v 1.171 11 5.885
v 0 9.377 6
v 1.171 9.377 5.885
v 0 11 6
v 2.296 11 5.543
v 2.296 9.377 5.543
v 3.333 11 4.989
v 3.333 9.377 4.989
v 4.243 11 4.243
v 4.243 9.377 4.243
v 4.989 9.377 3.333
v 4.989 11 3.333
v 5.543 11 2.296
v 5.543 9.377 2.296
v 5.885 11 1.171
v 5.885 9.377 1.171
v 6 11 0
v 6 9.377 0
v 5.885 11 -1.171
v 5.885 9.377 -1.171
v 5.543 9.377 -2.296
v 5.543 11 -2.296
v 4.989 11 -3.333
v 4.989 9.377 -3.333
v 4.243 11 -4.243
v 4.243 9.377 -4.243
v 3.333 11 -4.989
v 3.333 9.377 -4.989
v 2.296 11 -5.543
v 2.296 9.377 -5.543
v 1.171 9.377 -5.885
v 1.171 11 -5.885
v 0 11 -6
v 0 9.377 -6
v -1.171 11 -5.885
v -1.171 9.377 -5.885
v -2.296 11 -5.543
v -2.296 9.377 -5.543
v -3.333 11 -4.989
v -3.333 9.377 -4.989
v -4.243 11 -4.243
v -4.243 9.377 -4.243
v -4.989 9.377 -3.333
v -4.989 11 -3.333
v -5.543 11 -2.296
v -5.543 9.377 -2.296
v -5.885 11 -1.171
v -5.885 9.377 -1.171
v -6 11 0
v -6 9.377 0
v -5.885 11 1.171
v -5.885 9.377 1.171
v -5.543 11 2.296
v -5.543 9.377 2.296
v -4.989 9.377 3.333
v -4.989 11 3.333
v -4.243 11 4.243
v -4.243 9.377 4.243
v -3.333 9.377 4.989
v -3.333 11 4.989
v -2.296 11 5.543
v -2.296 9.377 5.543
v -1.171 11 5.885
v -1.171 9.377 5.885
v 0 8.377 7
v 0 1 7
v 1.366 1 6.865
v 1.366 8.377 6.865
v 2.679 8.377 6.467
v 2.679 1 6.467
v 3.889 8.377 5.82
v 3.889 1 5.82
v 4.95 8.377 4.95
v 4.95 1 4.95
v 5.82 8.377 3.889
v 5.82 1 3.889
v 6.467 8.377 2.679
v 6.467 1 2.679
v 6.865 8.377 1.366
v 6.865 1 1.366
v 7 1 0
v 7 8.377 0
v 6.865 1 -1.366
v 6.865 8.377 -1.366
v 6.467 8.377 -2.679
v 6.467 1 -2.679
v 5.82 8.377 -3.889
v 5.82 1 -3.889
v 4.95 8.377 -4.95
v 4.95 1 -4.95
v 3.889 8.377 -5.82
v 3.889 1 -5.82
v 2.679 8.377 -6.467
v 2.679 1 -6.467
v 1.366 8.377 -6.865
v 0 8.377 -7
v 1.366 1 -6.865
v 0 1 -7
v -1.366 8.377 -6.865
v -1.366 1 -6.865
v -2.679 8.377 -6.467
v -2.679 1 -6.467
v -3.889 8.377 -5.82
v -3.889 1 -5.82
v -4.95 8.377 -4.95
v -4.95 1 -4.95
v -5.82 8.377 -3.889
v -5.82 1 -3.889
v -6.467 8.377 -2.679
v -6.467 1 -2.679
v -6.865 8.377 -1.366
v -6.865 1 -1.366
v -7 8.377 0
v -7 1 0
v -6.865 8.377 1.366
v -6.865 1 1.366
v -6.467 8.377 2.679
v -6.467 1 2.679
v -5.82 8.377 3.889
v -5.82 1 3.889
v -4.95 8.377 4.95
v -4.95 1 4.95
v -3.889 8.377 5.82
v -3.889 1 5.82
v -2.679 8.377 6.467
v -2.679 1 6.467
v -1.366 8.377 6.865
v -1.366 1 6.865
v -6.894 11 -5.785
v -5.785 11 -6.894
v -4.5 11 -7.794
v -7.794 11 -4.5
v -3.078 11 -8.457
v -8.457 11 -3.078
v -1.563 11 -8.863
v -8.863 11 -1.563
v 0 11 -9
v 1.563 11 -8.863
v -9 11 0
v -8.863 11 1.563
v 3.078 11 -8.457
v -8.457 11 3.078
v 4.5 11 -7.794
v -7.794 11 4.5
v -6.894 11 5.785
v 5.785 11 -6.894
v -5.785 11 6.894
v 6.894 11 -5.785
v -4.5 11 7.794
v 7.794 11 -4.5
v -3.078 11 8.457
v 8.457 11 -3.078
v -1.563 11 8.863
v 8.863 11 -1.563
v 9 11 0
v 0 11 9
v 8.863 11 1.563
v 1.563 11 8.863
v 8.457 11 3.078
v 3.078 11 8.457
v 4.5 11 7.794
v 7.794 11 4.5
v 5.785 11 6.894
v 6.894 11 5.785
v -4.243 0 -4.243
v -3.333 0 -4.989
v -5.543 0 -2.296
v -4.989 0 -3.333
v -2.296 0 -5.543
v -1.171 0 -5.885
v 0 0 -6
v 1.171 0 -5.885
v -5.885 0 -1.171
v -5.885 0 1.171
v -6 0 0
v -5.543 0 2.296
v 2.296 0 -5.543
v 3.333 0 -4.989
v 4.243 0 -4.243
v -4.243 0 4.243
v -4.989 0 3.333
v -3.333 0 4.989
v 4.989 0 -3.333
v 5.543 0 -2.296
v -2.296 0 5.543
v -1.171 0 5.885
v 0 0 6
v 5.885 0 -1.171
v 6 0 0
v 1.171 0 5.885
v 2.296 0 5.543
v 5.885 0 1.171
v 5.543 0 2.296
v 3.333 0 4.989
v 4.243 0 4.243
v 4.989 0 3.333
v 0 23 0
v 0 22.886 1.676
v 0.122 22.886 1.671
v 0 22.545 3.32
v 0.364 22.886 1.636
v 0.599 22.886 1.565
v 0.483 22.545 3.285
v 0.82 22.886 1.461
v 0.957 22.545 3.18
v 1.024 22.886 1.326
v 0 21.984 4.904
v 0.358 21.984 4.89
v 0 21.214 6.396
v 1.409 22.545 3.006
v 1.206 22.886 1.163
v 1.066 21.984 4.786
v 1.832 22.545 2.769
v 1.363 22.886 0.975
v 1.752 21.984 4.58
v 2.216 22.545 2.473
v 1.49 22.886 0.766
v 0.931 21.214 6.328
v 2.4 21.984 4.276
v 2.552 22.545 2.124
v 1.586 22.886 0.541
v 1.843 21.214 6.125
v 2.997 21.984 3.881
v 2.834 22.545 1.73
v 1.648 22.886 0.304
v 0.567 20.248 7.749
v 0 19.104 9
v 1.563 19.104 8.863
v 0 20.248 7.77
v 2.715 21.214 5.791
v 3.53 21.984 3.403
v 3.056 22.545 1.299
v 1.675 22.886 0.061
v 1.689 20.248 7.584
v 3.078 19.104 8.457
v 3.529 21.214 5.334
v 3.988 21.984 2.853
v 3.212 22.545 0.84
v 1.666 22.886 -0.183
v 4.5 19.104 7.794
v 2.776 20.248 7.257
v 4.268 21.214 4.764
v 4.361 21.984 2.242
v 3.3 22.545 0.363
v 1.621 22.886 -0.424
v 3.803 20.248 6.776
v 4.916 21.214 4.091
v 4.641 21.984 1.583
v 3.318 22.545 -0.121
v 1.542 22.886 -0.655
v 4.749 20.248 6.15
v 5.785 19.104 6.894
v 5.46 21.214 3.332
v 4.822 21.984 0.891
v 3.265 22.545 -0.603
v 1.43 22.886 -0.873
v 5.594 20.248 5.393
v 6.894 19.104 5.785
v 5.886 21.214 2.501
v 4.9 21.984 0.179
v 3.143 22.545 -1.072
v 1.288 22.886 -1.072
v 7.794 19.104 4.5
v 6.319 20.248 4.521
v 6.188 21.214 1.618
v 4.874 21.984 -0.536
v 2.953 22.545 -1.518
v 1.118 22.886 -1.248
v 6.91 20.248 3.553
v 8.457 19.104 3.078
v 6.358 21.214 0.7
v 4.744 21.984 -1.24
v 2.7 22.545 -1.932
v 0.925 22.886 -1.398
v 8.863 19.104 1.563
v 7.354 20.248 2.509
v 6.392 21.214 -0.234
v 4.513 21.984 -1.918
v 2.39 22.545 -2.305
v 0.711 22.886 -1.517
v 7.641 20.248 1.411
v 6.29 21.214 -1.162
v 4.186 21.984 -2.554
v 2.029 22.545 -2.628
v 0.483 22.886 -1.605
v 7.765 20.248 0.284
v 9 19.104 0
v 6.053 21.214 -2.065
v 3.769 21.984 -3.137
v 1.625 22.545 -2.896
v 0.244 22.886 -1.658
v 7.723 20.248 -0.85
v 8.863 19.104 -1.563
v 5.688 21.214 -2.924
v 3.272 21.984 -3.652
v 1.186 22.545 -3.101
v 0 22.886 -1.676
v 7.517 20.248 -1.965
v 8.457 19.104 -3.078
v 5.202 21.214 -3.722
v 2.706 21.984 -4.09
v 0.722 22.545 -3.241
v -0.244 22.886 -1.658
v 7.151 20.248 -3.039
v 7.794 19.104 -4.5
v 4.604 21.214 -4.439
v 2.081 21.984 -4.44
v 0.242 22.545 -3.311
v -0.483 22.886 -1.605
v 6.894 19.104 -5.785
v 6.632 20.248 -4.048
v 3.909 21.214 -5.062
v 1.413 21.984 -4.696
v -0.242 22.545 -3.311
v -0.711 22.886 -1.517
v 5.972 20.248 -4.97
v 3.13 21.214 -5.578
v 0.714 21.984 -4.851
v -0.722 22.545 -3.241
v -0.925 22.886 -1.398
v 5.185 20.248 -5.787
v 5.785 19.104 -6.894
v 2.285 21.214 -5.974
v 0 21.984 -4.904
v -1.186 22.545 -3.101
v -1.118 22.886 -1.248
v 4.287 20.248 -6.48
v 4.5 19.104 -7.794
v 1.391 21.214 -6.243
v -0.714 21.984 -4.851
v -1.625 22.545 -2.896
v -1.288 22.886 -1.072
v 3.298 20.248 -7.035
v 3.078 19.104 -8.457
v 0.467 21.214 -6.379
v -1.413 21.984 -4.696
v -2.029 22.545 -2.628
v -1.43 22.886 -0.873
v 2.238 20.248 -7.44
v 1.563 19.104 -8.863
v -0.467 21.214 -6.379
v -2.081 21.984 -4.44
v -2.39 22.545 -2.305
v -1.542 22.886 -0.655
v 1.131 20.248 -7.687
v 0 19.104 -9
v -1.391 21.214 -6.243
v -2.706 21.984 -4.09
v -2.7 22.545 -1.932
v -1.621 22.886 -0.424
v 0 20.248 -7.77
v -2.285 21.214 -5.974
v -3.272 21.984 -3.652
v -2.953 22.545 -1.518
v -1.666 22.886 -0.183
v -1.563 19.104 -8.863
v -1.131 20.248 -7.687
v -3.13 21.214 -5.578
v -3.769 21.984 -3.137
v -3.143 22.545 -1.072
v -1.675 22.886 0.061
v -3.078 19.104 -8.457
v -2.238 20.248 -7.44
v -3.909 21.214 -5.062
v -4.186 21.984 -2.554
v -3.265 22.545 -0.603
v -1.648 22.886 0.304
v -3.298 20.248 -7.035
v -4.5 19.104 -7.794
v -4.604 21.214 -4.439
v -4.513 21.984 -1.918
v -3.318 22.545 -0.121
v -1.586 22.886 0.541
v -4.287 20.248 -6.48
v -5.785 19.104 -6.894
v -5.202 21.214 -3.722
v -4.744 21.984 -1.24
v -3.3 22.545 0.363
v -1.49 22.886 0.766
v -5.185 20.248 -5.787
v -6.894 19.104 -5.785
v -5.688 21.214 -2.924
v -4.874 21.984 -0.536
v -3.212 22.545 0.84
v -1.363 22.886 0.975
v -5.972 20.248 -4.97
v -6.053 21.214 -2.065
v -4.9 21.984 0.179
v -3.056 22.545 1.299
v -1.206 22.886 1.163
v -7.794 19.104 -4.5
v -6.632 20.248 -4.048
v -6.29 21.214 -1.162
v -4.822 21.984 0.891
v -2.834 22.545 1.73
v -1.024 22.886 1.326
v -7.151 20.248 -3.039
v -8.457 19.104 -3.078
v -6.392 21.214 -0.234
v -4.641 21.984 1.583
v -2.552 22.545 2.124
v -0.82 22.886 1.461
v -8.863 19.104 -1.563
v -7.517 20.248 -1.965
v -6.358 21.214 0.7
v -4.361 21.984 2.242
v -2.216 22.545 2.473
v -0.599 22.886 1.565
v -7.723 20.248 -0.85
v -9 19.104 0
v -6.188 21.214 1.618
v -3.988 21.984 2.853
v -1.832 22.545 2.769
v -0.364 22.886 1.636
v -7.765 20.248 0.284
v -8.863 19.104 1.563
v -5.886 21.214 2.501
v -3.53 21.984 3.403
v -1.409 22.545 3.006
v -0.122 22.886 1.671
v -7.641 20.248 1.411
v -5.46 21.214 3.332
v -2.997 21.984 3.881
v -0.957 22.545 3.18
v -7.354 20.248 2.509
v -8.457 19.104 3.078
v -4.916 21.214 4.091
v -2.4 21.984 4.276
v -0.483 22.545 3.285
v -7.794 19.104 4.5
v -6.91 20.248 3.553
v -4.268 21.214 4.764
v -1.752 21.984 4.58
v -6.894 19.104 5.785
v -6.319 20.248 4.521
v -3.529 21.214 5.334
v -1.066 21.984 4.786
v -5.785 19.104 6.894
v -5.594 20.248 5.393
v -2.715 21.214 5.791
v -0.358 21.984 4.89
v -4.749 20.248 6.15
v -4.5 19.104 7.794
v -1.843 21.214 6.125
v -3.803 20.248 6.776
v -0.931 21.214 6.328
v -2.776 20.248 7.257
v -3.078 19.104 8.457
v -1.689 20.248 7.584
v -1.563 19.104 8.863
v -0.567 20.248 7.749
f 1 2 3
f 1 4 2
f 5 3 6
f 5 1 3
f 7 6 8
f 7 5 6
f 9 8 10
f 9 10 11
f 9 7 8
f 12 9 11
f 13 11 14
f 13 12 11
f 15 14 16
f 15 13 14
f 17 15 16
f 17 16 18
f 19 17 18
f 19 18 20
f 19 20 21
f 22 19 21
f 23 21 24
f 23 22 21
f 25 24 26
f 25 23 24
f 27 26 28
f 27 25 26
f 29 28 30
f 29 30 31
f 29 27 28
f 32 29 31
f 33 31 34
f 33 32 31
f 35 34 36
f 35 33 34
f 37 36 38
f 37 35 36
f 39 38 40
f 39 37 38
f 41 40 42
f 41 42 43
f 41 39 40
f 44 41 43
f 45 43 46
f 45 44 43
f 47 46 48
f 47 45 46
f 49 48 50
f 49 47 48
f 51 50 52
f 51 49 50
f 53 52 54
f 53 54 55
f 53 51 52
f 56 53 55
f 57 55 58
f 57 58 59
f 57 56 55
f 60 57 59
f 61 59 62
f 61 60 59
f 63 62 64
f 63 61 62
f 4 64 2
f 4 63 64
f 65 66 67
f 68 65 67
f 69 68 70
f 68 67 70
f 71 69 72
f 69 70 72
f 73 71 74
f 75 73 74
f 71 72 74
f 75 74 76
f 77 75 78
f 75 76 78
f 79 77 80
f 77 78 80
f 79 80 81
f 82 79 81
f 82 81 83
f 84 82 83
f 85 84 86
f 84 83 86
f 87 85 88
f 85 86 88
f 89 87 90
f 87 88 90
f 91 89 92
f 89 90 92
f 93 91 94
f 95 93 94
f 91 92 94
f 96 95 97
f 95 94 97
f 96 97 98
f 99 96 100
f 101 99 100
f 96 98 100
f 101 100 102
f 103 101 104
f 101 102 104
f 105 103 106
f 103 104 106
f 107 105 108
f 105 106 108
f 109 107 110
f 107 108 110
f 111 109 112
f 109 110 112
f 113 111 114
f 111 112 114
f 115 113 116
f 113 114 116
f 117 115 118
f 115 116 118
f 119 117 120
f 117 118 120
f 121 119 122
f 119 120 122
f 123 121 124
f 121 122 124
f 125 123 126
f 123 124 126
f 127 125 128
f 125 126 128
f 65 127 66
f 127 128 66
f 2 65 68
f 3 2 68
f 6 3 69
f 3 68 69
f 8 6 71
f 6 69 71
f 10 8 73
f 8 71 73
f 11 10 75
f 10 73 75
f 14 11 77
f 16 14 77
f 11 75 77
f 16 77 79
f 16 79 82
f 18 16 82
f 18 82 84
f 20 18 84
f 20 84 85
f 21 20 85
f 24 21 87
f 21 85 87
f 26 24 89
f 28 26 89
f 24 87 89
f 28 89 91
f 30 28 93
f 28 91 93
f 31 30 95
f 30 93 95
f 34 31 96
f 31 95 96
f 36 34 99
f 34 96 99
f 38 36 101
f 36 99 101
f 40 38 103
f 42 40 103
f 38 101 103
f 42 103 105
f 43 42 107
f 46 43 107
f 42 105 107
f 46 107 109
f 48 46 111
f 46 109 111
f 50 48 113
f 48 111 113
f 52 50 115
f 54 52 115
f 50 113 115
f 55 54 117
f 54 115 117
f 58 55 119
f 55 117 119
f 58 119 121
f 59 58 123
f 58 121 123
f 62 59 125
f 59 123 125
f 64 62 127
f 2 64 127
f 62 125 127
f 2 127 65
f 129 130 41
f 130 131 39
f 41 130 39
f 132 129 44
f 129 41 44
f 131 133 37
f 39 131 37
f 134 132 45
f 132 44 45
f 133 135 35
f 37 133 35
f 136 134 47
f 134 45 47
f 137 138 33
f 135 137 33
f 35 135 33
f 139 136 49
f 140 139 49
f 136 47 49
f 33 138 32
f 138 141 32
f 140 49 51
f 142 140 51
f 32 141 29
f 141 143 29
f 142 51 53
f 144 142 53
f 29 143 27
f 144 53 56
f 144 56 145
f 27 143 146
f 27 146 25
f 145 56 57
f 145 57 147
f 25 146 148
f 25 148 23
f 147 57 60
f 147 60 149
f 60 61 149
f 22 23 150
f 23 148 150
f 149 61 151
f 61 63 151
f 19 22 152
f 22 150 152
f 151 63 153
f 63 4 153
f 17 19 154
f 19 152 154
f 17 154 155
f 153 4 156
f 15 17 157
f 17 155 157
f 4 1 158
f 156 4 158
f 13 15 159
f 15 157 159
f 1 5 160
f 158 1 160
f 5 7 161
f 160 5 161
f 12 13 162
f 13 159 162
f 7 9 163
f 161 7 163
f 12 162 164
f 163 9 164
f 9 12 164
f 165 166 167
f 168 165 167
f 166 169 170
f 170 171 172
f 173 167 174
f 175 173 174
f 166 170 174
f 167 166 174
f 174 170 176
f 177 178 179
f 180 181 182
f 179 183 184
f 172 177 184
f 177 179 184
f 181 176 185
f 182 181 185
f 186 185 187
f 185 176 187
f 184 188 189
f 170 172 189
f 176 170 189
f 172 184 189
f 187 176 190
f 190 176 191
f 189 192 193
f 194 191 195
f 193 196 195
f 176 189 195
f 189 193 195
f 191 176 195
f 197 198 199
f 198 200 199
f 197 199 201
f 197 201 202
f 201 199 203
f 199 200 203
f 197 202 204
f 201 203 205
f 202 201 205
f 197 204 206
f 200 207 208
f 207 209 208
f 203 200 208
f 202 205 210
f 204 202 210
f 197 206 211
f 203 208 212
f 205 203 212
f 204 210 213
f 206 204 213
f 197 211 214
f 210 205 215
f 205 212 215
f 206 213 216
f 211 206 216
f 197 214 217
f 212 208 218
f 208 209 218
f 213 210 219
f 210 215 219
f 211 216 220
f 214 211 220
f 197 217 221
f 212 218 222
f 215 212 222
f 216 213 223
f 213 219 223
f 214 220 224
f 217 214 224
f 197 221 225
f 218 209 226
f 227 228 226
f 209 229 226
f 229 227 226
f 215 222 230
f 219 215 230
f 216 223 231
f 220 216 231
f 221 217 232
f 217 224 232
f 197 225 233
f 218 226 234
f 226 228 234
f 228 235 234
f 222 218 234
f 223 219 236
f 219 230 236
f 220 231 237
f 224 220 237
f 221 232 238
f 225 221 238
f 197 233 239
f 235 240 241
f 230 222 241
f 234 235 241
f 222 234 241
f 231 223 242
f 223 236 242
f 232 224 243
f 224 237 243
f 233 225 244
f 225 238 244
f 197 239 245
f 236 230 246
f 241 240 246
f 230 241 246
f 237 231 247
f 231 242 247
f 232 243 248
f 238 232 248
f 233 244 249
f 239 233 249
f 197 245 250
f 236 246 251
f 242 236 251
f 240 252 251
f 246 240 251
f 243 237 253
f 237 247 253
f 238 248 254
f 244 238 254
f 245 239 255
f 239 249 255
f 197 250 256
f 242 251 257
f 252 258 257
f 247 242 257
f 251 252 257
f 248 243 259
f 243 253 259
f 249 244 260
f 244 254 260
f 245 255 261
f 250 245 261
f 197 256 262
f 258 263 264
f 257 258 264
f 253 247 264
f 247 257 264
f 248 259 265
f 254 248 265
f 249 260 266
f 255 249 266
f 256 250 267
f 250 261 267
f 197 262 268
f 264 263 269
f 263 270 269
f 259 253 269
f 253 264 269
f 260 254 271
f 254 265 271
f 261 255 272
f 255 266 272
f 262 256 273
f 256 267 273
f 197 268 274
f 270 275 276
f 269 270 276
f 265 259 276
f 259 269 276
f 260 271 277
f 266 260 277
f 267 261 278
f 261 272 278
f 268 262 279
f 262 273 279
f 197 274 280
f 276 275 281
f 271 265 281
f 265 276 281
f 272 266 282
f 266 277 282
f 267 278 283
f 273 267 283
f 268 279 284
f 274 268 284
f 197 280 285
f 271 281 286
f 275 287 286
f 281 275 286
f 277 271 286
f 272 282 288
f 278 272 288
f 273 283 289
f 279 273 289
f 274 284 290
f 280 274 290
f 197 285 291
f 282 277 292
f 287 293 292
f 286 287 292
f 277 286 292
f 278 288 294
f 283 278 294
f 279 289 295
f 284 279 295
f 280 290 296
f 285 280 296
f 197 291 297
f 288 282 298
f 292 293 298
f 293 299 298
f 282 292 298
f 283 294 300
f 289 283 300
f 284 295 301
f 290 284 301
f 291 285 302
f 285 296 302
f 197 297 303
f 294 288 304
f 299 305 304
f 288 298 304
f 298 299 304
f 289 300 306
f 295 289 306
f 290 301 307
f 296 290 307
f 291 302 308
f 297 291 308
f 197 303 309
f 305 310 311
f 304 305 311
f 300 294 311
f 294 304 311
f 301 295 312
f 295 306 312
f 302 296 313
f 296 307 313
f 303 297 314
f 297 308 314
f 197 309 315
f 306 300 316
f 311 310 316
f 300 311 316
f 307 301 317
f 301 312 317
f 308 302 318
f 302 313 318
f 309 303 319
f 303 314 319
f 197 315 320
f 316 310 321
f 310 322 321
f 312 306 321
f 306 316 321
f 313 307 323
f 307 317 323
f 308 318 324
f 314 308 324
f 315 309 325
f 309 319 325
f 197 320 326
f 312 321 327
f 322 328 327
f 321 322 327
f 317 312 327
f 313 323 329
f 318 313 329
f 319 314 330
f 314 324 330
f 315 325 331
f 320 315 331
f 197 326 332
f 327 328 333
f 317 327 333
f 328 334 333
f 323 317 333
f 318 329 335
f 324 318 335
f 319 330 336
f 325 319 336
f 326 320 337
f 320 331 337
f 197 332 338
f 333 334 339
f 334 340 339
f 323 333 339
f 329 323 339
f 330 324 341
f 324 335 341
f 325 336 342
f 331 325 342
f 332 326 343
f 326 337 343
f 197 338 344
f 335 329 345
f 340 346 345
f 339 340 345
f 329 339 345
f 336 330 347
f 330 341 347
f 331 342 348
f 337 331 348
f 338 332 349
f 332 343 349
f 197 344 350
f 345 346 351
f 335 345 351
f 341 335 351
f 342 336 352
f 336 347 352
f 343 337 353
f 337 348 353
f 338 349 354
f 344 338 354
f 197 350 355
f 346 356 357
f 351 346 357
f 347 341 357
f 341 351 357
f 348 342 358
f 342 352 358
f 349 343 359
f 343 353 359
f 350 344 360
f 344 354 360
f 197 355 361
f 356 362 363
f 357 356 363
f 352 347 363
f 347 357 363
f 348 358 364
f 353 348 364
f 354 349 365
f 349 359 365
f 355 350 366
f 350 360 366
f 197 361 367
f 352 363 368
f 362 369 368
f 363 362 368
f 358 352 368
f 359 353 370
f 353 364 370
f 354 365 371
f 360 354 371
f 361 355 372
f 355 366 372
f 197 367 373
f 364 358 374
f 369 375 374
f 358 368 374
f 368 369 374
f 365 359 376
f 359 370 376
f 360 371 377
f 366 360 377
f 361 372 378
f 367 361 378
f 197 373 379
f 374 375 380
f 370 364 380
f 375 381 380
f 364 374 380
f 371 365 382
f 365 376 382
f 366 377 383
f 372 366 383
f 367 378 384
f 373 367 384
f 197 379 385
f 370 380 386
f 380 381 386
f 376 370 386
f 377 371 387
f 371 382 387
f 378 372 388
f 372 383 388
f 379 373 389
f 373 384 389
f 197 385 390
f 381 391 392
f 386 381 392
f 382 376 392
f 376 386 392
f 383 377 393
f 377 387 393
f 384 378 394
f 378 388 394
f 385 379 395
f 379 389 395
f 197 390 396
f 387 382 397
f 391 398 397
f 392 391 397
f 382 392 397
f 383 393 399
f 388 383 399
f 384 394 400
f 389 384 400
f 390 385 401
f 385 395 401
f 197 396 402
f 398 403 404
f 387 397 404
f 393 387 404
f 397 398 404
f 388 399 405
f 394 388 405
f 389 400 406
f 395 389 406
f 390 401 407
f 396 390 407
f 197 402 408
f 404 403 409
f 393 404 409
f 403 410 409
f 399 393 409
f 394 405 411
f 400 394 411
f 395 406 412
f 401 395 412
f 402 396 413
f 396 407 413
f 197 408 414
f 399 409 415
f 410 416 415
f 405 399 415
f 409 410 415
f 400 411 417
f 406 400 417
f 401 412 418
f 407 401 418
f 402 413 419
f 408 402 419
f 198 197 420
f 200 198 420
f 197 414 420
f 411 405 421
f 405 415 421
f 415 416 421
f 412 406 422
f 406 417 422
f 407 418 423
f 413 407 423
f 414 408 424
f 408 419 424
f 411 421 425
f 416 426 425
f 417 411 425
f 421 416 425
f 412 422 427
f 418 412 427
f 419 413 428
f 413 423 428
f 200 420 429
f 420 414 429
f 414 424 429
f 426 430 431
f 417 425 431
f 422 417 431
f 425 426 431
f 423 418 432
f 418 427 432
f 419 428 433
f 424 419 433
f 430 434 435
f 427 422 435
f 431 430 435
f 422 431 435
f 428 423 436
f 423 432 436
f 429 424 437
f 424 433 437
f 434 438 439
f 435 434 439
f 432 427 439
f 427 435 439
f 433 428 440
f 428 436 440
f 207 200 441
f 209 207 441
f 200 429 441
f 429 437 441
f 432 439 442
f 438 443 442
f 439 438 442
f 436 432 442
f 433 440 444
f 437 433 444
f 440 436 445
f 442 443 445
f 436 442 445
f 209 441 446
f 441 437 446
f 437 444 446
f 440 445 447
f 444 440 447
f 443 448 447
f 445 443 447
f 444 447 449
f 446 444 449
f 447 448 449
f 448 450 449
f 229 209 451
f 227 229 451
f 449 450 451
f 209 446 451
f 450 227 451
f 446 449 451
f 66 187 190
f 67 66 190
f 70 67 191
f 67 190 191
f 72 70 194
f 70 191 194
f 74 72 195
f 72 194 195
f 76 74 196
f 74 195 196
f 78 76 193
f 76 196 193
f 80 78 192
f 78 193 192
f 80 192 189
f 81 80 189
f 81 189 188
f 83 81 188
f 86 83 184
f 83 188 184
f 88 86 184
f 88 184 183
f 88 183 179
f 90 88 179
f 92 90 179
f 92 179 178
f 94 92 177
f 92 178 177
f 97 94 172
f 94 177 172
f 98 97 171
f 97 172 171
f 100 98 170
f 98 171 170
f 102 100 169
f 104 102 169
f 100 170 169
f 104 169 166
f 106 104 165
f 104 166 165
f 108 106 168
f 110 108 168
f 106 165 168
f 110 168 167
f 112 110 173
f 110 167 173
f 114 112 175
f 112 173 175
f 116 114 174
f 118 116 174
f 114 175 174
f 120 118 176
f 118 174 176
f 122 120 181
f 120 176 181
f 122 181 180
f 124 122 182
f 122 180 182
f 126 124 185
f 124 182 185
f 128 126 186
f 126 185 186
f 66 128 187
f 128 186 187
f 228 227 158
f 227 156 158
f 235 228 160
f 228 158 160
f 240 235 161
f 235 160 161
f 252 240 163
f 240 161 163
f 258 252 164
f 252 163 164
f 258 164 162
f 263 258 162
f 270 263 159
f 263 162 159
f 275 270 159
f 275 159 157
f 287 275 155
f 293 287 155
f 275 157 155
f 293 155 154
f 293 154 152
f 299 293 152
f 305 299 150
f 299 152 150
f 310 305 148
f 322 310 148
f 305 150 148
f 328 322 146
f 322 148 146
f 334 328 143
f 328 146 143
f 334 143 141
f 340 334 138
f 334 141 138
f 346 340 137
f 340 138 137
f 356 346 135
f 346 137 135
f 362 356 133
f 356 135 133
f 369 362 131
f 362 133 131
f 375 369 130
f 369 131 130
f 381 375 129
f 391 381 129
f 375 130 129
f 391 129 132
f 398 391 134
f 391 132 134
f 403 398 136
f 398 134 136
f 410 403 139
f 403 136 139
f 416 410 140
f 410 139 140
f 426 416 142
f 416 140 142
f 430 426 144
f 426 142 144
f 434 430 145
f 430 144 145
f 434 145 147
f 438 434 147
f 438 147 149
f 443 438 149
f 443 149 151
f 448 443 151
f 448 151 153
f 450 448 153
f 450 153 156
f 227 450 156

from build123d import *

# Parameters (mm, degrees)
F0_W    = 1.6225828454
F0_H    = 6
F2_SIZE = 0.99999


# Not quite as in the source:
# - a fillet or chamfer is up to 0.001 mm smaller than in the source, because OpenCascade refuses the exact size


with BuildPart() as f1:
    # F0 (on Right) → F1 (revolve)
    with BuildSketch(Plane.YZ):
        Polygon((11, 6), (11, 0), (19.1040290039, 0), (19.1040290039, 9), (11, 9), (11, 7), align=None)
        with BuildLine():
            Line((19.1040290039, 9), (19.1040290039, 0))
            Line((19.1040290039, 0), (23, 0))
            ThreePointArc((23, 0), (21.9842102668, 4.9035341847), (19.1040290039, 9))
        make_face()
        Polygon((0, 7), (0, 0), (9.3774171546, 0), (9.3774171546, 6), (9.3774171546, 7), align=None)
        with Locations((10.1887085773, 3)):
            Rectangle(F0_W, F0_H)
    revolve(axis=Axis((0, 9.5520145019, 0), (0, 1, 0)))

    # F2 (size 1 in the source; OpenCascade refuses exactly that, so slightly less here)
    f2_edges = [f1.edges().sort_by_distance(p)[0] for p in [
        (0, 9.377417, -7),
        (0, 0, -7),
    ]]
    chamfer(f2_edges, length=F2_SIZE)


solid = f1.part
